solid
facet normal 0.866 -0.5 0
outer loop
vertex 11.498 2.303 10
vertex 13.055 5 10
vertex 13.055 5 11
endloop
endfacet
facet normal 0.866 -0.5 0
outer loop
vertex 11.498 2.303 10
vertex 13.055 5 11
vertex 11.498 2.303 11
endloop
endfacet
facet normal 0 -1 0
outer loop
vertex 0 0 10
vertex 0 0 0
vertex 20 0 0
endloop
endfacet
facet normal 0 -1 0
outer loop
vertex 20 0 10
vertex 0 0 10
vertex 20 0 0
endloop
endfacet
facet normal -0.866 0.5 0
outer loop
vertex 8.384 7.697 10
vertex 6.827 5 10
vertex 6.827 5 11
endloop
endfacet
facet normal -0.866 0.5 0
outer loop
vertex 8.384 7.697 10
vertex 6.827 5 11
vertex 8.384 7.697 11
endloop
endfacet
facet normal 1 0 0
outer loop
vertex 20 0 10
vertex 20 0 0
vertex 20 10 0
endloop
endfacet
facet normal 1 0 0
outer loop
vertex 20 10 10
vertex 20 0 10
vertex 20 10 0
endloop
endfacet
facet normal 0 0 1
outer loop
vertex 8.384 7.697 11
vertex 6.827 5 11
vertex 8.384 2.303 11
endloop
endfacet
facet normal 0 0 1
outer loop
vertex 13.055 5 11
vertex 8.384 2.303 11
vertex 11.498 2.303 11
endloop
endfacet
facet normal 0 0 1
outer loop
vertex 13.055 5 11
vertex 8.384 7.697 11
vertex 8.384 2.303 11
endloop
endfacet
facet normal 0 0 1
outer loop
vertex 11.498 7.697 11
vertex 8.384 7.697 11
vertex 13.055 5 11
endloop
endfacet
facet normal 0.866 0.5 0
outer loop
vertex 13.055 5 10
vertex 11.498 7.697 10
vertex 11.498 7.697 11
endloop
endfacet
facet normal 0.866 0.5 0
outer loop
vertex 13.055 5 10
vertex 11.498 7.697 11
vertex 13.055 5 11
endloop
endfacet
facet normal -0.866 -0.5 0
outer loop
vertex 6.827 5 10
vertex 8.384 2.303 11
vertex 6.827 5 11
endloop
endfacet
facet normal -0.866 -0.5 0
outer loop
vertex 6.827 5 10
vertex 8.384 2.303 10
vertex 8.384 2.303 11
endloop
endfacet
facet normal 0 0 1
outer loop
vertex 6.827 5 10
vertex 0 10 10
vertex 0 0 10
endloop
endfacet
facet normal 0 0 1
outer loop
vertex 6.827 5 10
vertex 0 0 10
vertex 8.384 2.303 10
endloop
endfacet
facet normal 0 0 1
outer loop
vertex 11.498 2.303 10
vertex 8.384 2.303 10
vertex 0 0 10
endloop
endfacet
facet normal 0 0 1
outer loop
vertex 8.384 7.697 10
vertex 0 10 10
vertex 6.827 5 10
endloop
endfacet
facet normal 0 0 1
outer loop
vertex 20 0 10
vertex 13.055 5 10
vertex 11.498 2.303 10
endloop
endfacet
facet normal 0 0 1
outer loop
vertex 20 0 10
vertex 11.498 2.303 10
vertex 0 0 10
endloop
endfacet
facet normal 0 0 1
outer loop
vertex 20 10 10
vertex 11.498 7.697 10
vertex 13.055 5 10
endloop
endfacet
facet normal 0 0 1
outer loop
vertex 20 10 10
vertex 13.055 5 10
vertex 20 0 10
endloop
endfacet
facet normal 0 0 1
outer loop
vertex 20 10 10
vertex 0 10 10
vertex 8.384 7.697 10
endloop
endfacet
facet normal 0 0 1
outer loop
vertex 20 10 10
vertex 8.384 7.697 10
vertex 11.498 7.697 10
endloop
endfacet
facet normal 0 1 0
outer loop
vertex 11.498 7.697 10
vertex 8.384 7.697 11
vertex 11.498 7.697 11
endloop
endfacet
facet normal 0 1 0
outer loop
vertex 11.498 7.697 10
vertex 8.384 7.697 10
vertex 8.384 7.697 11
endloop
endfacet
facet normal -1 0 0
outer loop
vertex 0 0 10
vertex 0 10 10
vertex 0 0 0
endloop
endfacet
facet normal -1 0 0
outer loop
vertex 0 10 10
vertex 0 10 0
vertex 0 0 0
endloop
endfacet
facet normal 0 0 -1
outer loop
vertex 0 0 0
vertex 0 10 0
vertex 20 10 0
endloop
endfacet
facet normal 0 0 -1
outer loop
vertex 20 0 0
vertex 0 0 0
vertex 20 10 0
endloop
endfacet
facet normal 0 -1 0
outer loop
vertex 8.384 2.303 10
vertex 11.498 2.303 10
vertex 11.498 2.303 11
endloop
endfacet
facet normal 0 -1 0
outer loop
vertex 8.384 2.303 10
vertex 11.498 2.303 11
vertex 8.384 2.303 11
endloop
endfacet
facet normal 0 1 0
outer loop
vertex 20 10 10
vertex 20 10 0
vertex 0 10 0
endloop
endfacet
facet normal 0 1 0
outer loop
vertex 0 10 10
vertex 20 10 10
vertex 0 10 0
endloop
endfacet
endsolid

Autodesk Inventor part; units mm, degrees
ref_plane "YZ Plane" through (0, 0, 0) normal (1, 0, 0) x (0, 1, 0)
ref_plane "XZ Plane" through (0, 0, 0) normal (0, 1, 0) x (-1, 0, 0)
ref_plane "XY Plane" through (0, 0, 0) normal (0, 0, 1) x (1, 0, 0)
sketch "Sketch1" plane through (0, 0, 0) normal (0, 0, 1) x (1, 0, 0)
  line L0 (0, 0) -> (20, 0)
  line L1 (20, 0) -> (20, 10)
  line L2 (20, 10) -> (0, 10)
  line L3 (0, 10) -> (0, 0)
  dimension "d0" = 20
  dimension "d1" = 10
extrude "Extrusion1" add sketch "Sketch1" along normal blind 10
sketch "Sketch2" plane through (0, 0, 10) normal (0, 0, 1) x (1, 0, 0)
  line L0 (0, 10) -> (0, 0) construction
  line L1 (0, 0) -> (19.8824, 10) construction
  line L2 (0, 10) -> (19.8824, 0) construction
  line L3 (6.8271, 5) -> (8.3842, 7.6969)
  line L4 (8.3842, 7.6969) -> (11.4983, 7.6969)
  line L5 (11.4983, 7.6969) -> (13.0553, 5)
  line L6 (13.0553, 5) -> (11.4983, 2.3031)
  line L7 (11.4983, 2.3031) -> (8.3842, 2.3031)
  line L8 (8.3842, 2.3031) -> (6.8271, 5)
  point P0 (9.9412, 5)
extrude "Extrusion2" add sketch "Sketch2" along normal blind 1
properties part number "Basic Sensor"
